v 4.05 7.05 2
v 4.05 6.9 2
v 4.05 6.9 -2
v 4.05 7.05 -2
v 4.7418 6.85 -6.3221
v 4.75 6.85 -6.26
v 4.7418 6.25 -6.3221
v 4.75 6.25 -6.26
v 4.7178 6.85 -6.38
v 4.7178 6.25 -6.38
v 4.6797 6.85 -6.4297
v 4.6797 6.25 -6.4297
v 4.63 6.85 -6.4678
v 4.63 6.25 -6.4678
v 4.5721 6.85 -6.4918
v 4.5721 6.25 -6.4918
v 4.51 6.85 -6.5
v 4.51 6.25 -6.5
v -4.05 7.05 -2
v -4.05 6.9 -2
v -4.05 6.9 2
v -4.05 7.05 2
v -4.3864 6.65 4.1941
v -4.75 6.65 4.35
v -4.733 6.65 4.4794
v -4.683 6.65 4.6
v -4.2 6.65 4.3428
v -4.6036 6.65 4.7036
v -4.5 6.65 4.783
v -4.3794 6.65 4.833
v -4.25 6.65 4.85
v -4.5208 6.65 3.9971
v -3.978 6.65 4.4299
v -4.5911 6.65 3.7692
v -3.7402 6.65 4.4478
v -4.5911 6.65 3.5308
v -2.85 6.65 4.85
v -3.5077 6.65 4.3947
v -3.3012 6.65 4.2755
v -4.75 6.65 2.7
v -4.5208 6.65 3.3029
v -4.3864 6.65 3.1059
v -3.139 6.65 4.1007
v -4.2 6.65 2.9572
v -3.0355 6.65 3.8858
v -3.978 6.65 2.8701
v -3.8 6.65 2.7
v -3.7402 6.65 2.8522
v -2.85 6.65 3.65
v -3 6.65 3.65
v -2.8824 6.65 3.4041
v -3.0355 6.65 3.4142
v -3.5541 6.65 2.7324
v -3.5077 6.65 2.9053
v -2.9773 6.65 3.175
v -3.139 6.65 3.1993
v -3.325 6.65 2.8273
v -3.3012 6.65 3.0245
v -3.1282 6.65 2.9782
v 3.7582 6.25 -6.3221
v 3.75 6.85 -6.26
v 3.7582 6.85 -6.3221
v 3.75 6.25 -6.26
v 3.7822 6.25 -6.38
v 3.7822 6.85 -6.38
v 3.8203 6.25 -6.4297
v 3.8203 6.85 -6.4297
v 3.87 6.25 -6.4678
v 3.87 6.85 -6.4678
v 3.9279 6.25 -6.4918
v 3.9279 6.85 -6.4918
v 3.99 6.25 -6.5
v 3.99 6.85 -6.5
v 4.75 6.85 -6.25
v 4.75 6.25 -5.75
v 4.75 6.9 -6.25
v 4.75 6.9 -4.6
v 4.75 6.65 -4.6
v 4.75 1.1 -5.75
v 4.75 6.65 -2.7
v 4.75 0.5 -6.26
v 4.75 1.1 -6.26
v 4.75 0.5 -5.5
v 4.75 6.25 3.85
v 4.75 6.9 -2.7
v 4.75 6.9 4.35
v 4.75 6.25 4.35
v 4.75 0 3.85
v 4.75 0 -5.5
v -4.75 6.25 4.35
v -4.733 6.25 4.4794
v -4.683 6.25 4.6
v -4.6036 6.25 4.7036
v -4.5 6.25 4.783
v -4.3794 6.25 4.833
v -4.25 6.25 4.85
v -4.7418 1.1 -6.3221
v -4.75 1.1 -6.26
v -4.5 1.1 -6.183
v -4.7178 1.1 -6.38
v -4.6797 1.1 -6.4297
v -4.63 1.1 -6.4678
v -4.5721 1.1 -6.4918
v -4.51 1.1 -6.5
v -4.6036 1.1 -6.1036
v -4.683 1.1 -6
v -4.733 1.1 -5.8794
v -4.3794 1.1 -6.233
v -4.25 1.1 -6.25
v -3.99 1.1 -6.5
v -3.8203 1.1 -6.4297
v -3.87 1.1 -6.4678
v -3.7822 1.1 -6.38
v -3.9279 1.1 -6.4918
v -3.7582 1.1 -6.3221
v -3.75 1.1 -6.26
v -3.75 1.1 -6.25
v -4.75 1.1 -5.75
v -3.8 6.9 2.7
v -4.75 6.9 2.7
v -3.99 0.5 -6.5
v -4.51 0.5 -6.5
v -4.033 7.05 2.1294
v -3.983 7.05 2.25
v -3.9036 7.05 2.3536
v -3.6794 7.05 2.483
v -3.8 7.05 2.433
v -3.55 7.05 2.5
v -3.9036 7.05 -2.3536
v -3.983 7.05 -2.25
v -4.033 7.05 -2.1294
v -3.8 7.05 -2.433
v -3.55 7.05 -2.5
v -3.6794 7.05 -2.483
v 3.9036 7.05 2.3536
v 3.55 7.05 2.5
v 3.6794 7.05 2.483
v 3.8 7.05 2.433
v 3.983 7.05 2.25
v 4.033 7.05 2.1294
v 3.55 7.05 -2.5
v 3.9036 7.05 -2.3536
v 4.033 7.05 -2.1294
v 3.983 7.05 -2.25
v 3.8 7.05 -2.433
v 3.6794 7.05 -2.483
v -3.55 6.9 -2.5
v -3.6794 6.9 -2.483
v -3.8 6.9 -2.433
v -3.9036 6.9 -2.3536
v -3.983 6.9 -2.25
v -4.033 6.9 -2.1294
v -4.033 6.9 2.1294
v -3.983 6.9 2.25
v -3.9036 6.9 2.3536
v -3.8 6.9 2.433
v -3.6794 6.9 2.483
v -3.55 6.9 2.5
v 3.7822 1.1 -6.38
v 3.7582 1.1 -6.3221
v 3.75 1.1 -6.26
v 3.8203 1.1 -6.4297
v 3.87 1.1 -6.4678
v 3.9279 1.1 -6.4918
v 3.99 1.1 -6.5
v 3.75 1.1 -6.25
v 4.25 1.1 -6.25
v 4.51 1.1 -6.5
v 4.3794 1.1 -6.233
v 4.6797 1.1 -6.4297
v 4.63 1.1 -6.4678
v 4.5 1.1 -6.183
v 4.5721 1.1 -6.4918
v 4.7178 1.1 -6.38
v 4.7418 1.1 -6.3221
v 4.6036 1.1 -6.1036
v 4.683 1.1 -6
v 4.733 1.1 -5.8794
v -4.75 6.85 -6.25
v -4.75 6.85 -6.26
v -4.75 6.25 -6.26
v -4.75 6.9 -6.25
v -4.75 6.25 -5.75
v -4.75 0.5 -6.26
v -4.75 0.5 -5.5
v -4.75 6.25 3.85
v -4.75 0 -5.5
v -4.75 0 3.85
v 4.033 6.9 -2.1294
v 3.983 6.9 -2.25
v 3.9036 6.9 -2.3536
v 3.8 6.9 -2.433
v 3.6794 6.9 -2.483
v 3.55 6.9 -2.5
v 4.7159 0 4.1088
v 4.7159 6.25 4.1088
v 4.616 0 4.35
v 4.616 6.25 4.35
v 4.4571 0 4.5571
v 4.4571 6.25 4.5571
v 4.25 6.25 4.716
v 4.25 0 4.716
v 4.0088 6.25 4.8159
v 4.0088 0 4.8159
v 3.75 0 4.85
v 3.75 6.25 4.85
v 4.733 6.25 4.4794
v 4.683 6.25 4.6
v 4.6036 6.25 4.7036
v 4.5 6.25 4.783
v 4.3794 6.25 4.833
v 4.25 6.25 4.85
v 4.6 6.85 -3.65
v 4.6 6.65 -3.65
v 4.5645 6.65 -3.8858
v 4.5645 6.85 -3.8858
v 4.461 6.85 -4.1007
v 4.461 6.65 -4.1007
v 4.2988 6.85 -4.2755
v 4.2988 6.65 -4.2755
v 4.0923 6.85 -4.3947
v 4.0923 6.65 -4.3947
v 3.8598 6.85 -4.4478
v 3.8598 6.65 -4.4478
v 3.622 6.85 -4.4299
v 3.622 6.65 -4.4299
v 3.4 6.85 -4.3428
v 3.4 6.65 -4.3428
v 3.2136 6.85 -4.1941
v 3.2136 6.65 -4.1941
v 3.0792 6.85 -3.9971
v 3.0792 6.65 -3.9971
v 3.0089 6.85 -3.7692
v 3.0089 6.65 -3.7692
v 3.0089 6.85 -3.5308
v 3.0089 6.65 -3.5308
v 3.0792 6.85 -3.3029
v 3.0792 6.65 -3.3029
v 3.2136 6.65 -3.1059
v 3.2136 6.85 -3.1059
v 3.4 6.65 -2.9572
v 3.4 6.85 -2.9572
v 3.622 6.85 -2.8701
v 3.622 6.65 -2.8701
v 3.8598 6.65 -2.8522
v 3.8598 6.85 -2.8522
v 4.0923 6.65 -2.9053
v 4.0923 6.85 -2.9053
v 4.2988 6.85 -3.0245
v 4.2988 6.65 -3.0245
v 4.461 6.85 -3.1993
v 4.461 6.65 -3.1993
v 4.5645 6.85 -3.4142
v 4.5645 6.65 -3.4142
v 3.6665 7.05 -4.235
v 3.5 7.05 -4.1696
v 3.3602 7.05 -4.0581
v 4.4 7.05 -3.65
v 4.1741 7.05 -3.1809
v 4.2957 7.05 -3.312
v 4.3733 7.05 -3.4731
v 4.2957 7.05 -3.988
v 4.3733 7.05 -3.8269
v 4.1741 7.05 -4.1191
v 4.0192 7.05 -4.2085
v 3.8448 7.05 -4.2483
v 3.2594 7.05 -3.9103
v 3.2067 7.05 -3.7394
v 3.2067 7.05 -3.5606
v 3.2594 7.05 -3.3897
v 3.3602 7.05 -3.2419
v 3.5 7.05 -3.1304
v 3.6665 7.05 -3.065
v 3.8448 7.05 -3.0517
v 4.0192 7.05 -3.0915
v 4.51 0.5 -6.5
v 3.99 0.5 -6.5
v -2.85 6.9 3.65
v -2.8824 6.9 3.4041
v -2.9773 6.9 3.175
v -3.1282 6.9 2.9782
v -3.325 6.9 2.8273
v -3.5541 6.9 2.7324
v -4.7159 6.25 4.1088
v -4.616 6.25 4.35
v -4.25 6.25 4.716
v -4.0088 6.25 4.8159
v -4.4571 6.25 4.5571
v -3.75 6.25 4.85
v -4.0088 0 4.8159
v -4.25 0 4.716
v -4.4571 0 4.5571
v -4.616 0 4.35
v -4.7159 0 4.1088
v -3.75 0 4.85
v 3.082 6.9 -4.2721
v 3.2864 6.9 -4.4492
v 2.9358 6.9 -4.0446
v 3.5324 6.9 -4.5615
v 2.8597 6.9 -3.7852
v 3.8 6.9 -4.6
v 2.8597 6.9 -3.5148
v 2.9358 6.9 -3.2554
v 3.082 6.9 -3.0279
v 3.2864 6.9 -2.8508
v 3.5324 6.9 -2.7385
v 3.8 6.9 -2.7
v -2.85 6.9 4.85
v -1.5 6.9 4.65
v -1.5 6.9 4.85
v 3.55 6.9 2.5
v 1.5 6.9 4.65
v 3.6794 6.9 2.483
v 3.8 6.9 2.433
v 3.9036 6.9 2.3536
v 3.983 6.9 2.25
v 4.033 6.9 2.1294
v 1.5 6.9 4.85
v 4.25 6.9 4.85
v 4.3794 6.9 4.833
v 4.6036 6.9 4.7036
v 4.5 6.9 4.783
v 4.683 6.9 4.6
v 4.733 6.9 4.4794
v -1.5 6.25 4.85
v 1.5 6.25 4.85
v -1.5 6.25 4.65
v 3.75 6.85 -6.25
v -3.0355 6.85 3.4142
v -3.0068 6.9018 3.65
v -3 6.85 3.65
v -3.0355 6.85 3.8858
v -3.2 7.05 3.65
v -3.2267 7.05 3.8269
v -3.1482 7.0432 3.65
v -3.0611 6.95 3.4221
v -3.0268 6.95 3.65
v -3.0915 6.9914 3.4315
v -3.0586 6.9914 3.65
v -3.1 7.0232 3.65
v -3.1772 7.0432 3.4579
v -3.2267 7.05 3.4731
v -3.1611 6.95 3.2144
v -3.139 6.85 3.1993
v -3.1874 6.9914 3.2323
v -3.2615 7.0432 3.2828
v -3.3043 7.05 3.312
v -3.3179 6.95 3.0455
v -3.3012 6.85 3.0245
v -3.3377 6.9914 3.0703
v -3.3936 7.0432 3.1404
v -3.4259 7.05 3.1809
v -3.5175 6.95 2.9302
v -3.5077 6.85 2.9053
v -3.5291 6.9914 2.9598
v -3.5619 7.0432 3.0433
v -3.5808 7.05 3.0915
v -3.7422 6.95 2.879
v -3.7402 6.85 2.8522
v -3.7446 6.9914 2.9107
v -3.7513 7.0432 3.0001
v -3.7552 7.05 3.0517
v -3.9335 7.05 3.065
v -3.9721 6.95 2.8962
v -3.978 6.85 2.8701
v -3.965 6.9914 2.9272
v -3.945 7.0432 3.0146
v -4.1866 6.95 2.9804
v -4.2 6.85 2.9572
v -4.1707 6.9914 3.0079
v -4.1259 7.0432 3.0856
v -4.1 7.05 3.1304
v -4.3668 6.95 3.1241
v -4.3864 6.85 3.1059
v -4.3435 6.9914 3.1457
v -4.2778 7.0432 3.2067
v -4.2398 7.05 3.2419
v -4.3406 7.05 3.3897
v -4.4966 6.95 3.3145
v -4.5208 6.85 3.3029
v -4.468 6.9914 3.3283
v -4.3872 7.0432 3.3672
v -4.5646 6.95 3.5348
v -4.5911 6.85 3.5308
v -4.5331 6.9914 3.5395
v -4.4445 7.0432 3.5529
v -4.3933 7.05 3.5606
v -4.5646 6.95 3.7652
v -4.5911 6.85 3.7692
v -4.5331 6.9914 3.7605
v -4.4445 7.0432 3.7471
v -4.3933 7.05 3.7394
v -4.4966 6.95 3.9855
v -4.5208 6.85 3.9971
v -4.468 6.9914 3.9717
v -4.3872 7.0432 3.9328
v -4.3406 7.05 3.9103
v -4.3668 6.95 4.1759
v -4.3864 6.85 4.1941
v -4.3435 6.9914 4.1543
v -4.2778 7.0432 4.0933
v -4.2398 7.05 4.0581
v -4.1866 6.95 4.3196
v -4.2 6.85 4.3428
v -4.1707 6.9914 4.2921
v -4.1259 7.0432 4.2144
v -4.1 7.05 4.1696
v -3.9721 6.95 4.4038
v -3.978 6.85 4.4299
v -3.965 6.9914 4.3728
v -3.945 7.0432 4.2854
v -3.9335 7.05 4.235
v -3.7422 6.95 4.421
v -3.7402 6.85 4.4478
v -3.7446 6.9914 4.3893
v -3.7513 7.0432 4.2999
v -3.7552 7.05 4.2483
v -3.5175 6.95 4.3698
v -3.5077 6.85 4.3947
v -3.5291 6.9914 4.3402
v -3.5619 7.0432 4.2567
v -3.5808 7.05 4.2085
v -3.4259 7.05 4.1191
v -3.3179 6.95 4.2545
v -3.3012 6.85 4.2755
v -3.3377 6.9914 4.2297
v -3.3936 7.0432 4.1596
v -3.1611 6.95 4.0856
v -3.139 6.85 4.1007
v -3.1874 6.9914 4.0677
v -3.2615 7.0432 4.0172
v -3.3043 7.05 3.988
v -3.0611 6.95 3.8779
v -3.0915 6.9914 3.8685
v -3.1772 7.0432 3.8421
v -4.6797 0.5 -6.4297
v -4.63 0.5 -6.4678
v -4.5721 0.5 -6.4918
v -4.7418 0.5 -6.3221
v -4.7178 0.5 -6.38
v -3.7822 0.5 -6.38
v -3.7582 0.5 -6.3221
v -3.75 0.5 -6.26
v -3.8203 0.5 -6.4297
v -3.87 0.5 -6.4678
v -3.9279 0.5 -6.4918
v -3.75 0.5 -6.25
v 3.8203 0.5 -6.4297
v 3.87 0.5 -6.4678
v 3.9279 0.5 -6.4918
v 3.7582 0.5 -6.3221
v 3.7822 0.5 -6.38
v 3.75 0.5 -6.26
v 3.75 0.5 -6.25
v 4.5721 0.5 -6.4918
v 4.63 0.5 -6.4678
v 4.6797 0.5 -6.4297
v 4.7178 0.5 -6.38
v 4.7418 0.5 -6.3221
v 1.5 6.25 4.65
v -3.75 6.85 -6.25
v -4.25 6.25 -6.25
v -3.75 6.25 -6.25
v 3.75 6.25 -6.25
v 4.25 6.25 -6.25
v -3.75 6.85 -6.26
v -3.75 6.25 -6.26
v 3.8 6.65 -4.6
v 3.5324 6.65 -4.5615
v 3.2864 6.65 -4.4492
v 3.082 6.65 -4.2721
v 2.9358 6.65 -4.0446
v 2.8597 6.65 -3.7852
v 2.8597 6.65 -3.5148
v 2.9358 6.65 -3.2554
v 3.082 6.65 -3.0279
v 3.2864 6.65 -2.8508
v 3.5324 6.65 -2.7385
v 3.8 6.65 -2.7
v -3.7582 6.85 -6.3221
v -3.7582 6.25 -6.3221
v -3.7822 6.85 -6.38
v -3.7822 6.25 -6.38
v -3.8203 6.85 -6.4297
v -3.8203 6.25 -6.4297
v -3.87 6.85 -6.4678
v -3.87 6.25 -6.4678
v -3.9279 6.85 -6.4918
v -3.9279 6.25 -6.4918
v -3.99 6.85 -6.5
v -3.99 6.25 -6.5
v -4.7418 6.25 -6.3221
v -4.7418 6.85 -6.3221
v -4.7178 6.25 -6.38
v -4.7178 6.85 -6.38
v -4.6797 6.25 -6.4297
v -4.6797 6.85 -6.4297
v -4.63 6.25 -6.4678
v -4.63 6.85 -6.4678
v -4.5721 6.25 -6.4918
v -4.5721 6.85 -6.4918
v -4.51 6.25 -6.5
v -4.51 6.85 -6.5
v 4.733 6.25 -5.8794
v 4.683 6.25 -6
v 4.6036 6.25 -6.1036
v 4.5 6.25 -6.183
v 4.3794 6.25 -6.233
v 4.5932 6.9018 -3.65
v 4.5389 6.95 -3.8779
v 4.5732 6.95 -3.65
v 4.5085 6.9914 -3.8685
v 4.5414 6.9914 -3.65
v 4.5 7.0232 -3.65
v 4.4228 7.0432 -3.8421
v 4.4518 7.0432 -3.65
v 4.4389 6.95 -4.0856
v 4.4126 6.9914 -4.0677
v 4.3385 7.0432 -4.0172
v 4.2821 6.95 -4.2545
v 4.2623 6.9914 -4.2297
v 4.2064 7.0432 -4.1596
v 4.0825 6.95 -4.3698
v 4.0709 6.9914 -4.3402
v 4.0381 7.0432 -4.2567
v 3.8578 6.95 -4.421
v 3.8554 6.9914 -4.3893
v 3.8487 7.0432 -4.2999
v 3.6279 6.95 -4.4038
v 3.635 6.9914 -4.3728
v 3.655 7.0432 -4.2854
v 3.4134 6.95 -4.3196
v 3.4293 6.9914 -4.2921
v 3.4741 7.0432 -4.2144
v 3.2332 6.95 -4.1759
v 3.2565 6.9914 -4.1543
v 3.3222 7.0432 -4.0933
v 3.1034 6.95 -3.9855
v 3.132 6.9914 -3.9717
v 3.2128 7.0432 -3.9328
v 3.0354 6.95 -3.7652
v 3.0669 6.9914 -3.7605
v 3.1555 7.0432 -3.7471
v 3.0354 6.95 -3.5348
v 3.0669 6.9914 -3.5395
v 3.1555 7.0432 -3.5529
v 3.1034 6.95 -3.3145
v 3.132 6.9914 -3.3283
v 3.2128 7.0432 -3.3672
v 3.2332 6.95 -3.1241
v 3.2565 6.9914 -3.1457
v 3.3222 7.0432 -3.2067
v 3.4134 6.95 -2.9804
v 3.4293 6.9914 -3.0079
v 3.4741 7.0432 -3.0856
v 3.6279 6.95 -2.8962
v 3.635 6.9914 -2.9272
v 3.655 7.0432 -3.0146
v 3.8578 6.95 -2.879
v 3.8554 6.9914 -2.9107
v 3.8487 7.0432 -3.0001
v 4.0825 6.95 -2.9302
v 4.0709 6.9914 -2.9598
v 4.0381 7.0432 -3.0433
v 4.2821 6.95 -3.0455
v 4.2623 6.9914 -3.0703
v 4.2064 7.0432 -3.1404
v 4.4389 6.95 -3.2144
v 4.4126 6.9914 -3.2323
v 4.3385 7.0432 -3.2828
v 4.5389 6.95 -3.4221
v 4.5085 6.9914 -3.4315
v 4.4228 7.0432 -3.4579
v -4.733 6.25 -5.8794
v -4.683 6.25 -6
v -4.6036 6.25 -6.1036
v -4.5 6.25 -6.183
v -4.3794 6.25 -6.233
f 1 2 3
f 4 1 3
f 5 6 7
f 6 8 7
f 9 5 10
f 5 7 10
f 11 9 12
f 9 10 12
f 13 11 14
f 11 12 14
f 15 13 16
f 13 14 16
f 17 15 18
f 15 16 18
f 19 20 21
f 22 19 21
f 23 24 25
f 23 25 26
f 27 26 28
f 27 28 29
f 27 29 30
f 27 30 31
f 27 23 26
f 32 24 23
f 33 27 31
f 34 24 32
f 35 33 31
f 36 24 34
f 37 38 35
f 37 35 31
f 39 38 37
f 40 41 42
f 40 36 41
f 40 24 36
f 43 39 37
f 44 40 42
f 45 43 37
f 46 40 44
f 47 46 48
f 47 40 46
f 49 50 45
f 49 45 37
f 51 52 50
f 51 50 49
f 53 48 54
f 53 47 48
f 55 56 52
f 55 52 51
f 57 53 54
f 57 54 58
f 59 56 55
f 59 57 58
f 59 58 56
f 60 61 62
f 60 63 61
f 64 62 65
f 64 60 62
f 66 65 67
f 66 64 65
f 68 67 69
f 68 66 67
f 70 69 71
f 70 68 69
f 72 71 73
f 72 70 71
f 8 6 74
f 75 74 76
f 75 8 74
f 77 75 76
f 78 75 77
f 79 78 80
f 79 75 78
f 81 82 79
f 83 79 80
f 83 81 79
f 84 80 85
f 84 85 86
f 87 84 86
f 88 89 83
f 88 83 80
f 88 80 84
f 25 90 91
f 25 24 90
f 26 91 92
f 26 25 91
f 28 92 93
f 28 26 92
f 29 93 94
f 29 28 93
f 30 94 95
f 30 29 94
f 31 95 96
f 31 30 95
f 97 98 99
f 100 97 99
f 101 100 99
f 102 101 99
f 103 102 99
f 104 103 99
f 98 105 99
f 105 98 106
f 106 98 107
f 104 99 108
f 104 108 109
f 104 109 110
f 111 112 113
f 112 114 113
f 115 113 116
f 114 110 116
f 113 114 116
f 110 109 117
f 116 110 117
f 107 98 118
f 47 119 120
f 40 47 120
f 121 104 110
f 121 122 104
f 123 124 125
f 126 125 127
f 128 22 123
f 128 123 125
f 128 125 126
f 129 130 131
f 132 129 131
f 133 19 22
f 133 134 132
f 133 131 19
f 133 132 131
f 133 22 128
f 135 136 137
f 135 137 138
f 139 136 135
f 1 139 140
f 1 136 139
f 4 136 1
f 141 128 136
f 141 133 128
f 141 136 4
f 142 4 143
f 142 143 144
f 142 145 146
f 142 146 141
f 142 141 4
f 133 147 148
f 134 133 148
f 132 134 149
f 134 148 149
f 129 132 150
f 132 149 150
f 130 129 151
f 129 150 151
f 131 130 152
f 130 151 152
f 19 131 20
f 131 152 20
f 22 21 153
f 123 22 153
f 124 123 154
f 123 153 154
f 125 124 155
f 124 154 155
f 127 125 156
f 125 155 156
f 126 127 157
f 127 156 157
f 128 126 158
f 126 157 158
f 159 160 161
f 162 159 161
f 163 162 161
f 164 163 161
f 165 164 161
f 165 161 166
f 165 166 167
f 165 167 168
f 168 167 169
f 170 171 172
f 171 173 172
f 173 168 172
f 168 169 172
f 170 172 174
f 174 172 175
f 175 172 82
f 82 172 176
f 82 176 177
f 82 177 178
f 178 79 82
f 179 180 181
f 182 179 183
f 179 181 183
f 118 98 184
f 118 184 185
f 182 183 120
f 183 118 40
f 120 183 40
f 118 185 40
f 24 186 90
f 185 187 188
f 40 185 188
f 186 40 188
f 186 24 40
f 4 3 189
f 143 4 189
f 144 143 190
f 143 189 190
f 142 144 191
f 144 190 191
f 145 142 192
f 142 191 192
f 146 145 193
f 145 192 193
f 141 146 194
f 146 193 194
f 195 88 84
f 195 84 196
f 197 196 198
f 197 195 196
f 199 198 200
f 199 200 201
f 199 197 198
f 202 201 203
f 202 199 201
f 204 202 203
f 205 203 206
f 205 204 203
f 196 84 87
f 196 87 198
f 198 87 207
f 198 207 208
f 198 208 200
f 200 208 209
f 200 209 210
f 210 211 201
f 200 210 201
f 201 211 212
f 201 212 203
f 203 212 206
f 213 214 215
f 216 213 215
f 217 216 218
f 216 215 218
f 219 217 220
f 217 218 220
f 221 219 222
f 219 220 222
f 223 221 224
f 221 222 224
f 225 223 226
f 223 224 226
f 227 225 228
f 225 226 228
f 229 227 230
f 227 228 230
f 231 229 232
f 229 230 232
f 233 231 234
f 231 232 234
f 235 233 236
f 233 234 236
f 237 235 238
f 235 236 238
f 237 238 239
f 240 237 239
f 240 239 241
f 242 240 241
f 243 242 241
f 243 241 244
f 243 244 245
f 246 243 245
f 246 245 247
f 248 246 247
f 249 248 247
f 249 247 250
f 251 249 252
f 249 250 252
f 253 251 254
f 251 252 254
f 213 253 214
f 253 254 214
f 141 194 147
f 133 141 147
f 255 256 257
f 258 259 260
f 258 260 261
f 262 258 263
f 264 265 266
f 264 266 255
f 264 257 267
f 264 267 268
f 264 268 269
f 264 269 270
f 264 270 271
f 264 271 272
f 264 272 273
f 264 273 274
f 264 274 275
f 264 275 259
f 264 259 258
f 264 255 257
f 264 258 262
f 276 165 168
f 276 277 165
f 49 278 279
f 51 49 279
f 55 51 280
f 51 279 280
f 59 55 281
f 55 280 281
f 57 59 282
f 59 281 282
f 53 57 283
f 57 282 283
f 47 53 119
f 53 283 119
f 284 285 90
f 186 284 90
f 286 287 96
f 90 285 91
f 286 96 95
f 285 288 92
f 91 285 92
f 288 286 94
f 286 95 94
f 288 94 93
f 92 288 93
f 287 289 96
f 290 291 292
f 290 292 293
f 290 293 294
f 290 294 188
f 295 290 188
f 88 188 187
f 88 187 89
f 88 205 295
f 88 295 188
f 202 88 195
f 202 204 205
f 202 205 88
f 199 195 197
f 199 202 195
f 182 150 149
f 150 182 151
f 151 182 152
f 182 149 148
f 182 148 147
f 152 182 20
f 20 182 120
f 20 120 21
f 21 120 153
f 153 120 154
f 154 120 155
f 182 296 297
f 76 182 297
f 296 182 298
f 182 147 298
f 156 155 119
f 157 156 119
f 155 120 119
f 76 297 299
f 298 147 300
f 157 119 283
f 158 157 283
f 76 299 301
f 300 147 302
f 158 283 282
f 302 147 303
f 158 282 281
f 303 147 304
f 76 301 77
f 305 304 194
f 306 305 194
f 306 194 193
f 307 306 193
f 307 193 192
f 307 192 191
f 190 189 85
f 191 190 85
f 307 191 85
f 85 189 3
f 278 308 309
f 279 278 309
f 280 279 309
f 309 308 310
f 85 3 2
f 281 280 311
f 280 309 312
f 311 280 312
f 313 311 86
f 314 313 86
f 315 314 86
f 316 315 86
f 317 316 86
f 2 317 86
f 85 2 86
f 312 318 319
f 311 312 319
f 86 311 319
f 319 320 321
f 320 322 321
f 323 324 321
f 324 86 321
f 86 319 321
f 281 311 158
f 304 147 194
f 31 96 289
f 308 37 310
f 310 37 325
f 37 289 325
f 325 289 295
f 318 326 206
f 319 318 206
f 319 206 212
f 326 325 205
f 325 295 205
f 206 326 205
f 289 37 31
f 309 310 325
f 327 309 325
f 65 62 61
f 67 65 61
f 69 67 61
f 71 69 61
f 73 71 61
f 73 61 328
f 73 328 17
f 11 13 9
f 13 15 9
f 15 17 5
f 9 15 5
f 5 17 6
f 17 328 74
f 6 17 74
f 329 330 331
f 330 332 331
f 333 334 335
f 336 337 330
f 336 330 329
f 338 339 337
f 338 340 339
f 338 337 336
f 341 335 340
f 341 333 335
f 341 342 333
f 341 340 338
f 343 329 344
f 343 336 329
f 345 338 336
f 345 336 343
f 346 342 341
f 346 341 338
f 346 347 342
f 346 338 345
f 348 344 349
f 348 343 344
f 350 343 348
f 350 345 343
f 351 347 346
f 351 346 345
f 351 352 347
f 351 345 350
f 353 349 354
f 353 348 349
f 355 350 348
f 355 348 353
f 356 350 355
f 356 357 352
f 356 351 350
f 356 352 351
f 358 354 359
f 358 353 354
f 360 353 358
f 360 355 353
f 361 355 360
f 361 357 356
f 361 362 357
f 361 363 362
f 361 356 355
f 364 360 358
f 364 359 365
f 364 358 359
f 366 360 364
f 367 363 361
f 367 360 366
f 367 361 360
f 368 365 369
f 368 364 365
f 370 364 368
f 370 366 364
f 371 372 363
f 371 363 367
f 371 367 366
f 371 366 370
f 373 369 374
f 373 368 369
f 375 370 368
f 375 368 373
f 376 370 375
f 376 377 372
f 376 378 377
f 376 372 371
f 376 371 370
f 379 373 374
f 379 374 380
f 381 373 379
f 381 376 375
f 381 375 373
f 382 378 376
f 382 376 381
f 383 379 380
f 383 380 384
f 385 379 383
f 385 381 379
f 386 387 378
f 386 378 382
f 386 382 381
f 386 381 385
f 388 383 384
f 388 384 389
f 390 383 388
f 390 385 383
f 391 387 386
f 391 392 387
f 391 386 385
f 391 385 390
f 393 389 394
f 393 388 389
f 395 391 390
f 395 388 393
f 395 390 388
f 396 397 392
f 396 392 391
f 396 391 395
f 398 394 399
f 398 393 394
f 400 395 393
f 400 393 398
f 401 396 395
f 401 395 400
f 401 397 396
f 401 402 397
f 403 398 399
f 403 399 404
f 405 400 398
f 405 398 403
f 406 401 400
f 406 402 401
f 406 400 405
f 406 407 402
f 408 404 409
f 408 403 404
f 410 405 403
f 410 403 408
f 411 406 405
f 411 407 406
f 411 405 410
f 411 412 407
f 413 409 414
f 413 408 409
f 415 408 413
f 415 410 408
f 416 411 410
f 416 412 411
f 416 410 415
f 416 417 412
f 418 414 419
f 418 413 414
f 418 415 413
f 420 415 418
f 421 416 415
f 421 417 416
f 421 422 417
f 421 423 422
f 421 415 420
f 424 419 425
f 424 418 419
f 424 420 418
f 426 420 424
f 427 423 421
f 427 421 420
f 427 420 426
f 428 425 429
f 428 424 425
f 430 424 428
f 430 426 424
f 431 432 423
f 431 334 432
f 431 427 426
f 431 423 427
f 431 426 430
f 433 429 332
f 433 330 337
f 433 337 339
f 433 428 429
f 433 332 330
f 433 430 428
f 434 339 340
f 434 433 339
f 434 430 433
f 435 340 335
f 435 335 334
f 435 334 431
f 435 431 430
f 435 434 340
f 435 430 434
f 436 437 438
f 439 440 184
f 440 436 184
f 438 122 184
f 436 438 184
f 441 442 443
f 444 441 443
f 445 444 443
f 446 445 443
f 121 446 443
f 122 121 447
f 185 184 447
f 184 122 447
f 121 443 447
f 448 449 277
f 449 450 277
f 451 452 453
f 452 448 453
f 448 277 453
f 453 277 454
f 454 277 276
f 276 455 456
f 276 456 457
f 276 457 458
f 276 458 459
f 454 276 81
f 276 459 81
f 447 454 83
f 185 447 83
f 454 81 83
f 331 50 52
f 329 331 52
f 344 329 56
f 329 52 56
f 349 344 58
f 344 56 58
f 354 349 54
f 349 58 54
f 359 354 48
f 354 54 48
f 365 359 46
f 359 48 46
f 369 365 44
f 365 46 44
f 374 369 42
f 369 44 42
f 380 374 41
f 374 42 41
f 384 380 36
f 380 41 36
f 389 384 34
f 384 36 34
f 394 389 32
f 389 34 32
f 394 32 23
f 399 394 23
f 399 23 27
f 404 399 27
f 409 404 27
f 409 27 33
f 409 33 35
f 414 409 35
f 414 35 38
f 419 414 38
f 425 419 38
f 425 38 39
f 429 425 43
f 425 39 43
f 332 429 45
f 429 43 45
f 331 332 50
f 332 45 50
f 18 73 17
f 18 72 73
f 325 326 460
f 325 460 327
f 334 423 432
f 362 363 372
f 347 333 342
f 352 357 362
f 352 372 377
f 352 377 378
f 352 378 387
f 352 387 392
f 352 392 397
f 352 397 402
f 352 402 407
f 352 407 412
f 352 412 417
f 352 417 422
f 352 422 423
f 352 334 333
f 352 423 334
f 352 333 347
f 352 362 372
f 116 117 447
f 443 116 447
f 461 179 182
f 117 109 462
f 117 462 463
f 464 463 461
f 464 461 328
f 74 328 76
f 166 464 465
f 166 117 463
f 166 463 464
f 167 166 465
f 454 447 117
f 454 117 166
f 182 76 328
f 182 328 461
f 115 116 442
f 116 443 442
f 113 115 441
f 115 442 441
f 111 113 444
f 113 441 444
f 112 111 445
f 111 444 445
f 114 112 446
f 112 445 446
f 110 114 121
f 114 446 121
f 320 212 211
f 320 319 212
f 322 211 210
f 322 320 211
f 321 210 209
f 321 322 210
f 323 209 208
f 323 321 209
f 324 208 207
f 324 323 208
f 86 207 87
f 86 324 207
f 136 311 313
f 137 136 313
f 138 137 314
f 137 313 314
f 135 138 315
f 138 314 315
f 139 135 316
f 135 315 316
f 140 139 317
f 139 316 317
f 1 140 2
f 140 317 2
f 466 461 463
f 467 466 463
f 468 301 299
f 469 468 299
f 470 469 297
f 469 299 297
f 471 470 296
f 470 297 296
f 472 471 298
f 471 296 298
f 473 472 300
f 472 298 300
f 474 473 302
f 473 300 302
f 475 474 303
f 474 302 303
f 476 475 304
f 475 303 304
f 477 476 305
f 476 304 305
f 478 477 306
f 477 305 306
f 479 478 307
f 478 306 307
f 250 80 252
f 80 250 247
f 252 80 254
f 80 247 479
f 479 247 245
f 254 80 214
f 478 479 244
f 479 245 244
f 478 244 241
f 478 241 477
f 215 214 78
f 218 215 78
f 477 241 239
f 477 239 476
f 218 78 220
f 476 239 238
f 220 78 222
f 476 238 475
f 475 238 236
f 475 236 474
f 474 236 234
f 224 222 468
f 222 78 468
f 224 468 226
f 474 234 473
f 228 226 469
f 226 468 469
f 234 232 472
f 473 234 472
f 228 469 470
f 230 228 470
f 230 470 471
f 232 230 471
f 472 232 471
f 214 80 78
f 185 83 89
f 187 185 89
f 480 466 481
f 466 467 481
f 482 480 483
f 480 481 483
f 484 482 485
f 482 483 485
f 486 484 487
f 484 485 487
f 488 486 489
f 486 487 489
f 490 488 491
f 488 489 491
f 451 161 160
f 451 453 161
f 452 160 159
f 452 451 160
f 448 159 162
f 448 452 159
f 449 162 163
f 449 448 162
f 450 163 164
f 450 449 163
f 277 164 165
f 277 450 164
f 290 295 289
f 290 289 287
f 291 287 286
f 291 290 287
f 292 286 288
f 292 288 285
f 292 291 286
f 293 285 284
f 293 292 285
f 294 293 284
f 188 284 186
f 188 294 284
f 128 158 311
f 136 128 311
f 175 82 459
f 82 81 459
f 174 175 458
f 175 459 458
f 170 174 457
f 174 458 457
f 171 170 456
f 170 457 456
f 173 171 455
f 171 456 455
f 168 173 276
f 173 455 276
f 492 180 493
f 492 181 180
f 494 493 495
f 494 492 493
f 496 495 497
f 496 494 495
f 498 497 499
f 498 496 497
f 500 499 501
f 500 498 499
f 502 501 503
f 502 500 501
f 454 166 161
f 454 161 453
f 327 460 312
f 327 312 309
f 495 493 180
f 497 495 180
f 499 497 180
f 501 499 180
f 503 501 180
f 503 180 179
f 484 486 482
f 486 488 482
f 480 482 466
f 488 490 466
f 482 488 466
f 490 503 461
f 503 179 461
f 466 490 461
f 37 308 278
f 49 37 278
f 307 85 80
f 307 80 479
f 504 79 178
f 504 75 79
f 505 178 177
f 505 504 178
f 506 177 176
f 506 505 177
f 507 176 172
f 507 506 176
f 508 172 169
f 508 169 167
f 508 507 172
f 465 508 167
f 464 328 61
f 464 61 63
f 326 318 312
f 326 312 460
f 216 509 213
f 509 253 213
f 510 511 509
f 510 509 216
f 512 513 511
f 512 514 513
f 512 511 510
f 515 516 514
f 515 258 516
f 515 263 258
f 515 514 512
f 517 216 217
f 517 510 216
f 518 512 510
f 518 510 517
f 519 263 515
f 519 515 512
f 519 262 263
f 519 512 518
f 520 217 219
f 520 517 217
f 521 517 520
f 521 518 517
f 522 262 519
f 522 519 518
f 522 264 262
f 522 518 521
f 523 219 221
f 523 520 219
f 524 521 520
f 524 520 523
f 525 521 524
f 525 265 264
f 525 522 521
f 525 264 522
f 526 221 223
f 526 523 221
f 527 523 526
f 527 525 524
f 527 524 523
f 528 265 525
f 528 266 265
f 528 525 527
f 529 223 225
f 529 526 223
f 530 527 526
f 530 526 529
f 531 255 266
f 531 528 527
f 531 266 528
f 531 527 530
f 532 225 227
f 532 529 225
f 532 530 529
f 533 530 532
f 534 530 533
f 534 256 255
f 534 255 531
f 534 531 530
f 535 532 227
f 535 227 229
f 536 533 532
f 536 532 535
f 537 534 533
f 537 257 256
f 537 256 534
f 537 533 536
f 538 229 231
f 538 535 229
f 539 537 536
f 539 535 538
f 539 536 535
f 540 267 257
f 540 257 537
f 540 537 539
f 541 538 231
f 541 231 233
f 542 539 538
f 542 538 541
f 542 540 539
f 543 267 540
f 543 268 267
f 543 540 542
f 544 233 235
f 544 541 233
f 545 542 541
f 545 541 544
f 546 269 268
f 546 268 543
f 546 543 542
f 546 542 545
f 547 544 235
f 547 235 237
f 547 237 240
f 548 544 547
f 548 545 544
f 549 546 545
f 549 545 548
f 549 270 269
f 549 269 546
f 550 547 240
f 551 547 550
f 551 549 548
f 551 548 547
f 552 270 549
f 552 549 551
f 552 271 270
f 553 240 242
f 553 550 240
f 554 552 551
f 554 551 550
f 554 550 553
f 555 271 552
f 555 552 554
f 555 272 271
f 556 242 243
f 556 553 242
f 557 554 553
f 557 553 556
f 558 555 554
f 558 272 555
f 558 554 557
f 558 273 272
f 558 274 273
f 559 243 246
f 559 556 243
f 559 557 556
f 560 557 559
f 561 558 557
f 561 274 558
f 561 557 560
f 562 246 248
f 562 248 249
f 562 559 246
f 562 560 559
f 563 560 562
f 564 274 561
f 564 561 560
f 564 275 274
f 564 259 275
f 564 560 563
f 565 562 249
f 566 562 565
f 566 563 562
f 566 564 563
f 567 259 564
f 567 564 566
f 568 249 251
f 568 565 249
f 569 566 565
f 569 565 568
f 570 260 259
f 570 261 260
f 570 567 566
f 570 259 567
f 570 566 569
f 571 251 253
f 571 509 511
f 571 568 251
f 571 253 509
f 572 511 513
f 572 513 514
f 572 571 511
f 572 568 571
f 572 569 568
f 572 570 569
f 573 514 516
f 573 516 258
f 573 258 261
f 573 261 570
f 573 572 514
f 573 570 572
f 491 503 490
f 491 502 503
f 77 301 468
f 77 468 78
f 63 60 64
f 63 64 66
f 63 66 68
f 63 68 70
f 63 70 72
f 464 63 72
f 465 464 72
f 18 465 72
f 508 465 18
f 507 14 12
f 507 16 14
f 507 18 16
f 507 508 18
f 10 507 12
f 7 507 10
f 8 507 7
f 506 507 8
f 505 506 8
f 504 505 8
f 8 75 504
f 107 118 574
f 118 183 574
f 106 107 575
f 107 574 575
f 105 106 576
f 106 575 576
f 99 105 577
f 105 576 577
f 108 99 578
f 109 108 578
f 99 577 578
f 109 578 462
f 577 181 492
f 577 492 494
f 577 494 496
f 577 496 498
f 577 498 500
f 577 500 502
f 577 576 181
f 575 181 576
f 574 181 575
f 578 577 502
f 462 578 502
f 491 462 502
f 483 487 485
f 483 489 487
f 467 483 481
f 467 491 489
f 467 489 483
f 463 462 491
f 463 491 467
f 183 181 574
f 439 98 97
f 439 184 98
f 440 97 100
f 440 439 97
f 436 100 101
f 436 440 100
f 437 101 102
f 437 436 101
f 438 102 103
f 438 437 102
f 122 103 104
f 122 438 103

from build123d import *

# Parameters (mm, degrees)
SKETCH006_W     = 9.5
SKETCH006_H     = 11.1
PAD004_DEPTH    = 6.9
PAD005_DEPTH    = 0.15
POCKET002_DEPTH = 0.25
SKETCH009_R     = 0.8
PAD006_DEPTH    = 0.4
FILLET003_R     = 0.2
SKETCH010_W     = 1
SKETCH010_H     = 0.6
PAD007_DEPTH    = 0.25
FILLET004_R     = 0.24
SKETCH011_W     = 0.75
SKETCH011_H     = 0.5
POCKET003_DEPTH = 9.5
FILLET005_R     = 0.5
POCKET004_DEPTH = 6.25
FILLET006_R     = 0.5
SKETCH013_W     = 3
SKETCH013_H     = 0.65
POCKET005_DEPTH = 0.2


with BuildPart() as part:
    # Sketch006 → Pad004 (new body)
    with BuildSketch(Plane.XZ):
        with Locations((0, -0.7)):
            Rectangle(SKETCH006_W, SKETCH006_H)
    extrude(amount=-PAD004_DEPTH)

    # Sketch007 (on Face6 of Pad004) → Pad005 (join)
    with BuildSketch(Plane(origin=(0, 6.9, 0), x_dir=(1, 0, 0), z_dir=(0, 1, 0))):
        with BuildLine():
            Line((-4.05, 2), (-4.05, -2))
            ThreePointArc((-4.05, -2), (-3.903553, -2.353553), (-3.55, -2.5))
            Line((-3.55, -2.5), (3.55, -2.5))
            ThreePointArc((3.55, -2.5), (3.903553, -2.353553), (4.05, -2))
            Line((4.05, -2), (4.05, 2))
            ThreePointArc((4.05, 2), (3.903553, 2.353553), (3.55, 2.5))
            Line((3.55, 2.5), (-3.55, 2.5))
            ThreePointArc((-3.55, 2.5), (-3.903553, 2.353553), (-4.05, 2))
        make_face()
    extrude(amount=PAD005_DEPTH)

    # Sketch008 (on Face5 of Pad005) → Pocket002 (cut)
    with BuildSketch(Plane(origin=(0, 6.9, 0), x_dir=(1, 0, 0), z_dir=(0, 1, 0))):
        with BuildLine():
            Line((-3.8, -2.7), (-4.75, -2.7))
            Line((-4.75, -2.7), (-4.75, -4.85))
            Line((-4.75, -4.85), (-2.85, -4.85))
            Line((-2.85, -4.85), (-2.85, -3.65))
            ThreePointArc((-2.85, -3.65), (-3.128249, -2.978249), (-3.8, -2.7))
        make_face()
        with BuildLine():
            Line((3.8, 4.6), (4.75, 4.6))
            Line((4.75, 4.6), (4.75, 2.7))
            Line((4.75, 2.7), (3.8, 2.7))
            ThreePointArc((3.8, 4.6), (2.85, 3.65), (3.8, 2.7))
        make_face()
    extrude(amount=-POCKET002_DEPTH, mode=Mode.SUBTRACT)

    # Sketch009 (on Face22 of Pocket002) → Pad006 (join)
    with BuildSketch(Plane(origin=(0, 6.65, 0), x_dir=(1, 0, 0), z_dir=(0, 1, 0))):
        with Locations((3.8, 3.65)):
            Circle(SKETCH009_R)
        with Locations((-3.8, -3.65)):
            Circle(SKETCH009_R)
    extrude(amount=PAD006_DEPTH)

    # Fillet003
    fillet003_edges = [part.edges().sort_by_distance(p)[0] for p in [
        (3, 7.05, -3.65),
        (-4.6, 7.05, 3.65),
    ]]
    fillet(fillet003_edges, radius=FILLET003_R)

    # Sketch010 (on Face12 of Fillet003) → Pad007 (join)
    with BuildSketch(Plane(origin=(0, 0, -6.25), x_dir=(1, 0, 0), z_dir=(0, 0, -1))):
        with Locations((-4.25, -0.8)):
            Rectangle(SKETCH010_W, SKETCH010_H)
        with Locations((-4.25, -6.55)):
            Rectangle(SKETCH010_W, SKETCH010_H)
        with Locations((4.25, -0.8)):
            Rectangle(SKETCH010_W, SKETCH010_H)
        with Locations((4.25, -6.55)):
            Rectangle(SKETCH010_W, SKETCH010_H)
    extrude(amount=PAD007_DEPTH)

    # Fillet004
    fillet004_edges = [part.edges().sort_by_distance(p)[0] for p in [
        (-3.75, 0.8, -6.5),
        (-4.75, 0.8, -6.5),
        (3.75, 0.8, -6.5),
        (4.75, 0.8, -6.5),
        (4.75, 6.55, -6.5),
        (3.75, 6.55, -6.5),
        (-3.75, 6.55, -6.5),
        (-4.75, 6.55, -6.5),
    ]]
    fillet(fillet004_edges, radius=FILLET004_R)

    # Sketch011 (on Face16 of Fillet004) → Pocket003 (cut)
    with BuildSketch(Plane(origin=(4.75, 0, 0), x_dir=(0, 0, 1), z_dir=(1, 0, 0))):
        with Locations((-5.875, -0.25)):
            Rectangle(SKETCH011_W, SKETCH011_H)
    extrude(amount=-POCKET003_DEPTH, mode=Mode.SUBTRACT)

    # Fillet005
    fillet005_edges = [part.edges().sort_by_distance(p)[0] for p in [
        (-4.75, 3.675, -6.25),
        (4.75, 3.675, -6.25),
    ]]
    fillet(fillet005_edges, radius=FILLET005_R)

    # Sketch012 (on Face25 of Fillet005) → Pocket004 (cut)
    with BuildSketch(Plane.XZ):
        with BuildLine():
            Line((3.75, 4.85), (3.75, 5.85))
            Line((3.75, 5.85), (5.75, 5.85))
            Line((5.75, 5.85), (5.75, 3.85))
            Line((5.75, 3.85), (4.75, 3.85))
            ThreePointArc((4.75, 3.85), (4.457107, 4.557107), (3.75, 4.85))
        make_face()
        with BuildLine():
            ThreePointArc((-3.75, 4.85), (-4.457107, 4.557107), (-4.75, 3.85))
            Line((-5.75, 3.85), (-4.75, 3.85))
            Line((-5.75, 5.85), (-5.75, 3.85))
            Line((-3.75, 5.85), (-5.75, 5.85))
            Line((-3.75, 4.85), (-3.75, 5.85))
        make_face()
    extrude(amount=-POCKET004_DEPTH, mode=Mode.SUBTRACT)

    # Fillet006
    fillet006_edges = [part.edges().sort_by_distance(p)[0] for p in [
        (4.75, 6.575, 4.85),
        (-4.75, 6.45, 4.85),
    ]]
    fillet(fillet006_edges, radius=FILLET006_R)

    # Sketch013 (on Face17 of Fillet006) → Pocket005 (cut)
    with BuildSketch(Plane(origin=(0, 0, 4.85), x_dir=(-1, 0, 0), z_dir=(0, 0, 1))):
        with Locations((0, -6.575)):
            Rectangle(SKETCH013_W, SKETCH013_H)
    extrude(amount=-POCKET005_DEPTH, mode=Mode.SUBTRACT)


solid = part.part
